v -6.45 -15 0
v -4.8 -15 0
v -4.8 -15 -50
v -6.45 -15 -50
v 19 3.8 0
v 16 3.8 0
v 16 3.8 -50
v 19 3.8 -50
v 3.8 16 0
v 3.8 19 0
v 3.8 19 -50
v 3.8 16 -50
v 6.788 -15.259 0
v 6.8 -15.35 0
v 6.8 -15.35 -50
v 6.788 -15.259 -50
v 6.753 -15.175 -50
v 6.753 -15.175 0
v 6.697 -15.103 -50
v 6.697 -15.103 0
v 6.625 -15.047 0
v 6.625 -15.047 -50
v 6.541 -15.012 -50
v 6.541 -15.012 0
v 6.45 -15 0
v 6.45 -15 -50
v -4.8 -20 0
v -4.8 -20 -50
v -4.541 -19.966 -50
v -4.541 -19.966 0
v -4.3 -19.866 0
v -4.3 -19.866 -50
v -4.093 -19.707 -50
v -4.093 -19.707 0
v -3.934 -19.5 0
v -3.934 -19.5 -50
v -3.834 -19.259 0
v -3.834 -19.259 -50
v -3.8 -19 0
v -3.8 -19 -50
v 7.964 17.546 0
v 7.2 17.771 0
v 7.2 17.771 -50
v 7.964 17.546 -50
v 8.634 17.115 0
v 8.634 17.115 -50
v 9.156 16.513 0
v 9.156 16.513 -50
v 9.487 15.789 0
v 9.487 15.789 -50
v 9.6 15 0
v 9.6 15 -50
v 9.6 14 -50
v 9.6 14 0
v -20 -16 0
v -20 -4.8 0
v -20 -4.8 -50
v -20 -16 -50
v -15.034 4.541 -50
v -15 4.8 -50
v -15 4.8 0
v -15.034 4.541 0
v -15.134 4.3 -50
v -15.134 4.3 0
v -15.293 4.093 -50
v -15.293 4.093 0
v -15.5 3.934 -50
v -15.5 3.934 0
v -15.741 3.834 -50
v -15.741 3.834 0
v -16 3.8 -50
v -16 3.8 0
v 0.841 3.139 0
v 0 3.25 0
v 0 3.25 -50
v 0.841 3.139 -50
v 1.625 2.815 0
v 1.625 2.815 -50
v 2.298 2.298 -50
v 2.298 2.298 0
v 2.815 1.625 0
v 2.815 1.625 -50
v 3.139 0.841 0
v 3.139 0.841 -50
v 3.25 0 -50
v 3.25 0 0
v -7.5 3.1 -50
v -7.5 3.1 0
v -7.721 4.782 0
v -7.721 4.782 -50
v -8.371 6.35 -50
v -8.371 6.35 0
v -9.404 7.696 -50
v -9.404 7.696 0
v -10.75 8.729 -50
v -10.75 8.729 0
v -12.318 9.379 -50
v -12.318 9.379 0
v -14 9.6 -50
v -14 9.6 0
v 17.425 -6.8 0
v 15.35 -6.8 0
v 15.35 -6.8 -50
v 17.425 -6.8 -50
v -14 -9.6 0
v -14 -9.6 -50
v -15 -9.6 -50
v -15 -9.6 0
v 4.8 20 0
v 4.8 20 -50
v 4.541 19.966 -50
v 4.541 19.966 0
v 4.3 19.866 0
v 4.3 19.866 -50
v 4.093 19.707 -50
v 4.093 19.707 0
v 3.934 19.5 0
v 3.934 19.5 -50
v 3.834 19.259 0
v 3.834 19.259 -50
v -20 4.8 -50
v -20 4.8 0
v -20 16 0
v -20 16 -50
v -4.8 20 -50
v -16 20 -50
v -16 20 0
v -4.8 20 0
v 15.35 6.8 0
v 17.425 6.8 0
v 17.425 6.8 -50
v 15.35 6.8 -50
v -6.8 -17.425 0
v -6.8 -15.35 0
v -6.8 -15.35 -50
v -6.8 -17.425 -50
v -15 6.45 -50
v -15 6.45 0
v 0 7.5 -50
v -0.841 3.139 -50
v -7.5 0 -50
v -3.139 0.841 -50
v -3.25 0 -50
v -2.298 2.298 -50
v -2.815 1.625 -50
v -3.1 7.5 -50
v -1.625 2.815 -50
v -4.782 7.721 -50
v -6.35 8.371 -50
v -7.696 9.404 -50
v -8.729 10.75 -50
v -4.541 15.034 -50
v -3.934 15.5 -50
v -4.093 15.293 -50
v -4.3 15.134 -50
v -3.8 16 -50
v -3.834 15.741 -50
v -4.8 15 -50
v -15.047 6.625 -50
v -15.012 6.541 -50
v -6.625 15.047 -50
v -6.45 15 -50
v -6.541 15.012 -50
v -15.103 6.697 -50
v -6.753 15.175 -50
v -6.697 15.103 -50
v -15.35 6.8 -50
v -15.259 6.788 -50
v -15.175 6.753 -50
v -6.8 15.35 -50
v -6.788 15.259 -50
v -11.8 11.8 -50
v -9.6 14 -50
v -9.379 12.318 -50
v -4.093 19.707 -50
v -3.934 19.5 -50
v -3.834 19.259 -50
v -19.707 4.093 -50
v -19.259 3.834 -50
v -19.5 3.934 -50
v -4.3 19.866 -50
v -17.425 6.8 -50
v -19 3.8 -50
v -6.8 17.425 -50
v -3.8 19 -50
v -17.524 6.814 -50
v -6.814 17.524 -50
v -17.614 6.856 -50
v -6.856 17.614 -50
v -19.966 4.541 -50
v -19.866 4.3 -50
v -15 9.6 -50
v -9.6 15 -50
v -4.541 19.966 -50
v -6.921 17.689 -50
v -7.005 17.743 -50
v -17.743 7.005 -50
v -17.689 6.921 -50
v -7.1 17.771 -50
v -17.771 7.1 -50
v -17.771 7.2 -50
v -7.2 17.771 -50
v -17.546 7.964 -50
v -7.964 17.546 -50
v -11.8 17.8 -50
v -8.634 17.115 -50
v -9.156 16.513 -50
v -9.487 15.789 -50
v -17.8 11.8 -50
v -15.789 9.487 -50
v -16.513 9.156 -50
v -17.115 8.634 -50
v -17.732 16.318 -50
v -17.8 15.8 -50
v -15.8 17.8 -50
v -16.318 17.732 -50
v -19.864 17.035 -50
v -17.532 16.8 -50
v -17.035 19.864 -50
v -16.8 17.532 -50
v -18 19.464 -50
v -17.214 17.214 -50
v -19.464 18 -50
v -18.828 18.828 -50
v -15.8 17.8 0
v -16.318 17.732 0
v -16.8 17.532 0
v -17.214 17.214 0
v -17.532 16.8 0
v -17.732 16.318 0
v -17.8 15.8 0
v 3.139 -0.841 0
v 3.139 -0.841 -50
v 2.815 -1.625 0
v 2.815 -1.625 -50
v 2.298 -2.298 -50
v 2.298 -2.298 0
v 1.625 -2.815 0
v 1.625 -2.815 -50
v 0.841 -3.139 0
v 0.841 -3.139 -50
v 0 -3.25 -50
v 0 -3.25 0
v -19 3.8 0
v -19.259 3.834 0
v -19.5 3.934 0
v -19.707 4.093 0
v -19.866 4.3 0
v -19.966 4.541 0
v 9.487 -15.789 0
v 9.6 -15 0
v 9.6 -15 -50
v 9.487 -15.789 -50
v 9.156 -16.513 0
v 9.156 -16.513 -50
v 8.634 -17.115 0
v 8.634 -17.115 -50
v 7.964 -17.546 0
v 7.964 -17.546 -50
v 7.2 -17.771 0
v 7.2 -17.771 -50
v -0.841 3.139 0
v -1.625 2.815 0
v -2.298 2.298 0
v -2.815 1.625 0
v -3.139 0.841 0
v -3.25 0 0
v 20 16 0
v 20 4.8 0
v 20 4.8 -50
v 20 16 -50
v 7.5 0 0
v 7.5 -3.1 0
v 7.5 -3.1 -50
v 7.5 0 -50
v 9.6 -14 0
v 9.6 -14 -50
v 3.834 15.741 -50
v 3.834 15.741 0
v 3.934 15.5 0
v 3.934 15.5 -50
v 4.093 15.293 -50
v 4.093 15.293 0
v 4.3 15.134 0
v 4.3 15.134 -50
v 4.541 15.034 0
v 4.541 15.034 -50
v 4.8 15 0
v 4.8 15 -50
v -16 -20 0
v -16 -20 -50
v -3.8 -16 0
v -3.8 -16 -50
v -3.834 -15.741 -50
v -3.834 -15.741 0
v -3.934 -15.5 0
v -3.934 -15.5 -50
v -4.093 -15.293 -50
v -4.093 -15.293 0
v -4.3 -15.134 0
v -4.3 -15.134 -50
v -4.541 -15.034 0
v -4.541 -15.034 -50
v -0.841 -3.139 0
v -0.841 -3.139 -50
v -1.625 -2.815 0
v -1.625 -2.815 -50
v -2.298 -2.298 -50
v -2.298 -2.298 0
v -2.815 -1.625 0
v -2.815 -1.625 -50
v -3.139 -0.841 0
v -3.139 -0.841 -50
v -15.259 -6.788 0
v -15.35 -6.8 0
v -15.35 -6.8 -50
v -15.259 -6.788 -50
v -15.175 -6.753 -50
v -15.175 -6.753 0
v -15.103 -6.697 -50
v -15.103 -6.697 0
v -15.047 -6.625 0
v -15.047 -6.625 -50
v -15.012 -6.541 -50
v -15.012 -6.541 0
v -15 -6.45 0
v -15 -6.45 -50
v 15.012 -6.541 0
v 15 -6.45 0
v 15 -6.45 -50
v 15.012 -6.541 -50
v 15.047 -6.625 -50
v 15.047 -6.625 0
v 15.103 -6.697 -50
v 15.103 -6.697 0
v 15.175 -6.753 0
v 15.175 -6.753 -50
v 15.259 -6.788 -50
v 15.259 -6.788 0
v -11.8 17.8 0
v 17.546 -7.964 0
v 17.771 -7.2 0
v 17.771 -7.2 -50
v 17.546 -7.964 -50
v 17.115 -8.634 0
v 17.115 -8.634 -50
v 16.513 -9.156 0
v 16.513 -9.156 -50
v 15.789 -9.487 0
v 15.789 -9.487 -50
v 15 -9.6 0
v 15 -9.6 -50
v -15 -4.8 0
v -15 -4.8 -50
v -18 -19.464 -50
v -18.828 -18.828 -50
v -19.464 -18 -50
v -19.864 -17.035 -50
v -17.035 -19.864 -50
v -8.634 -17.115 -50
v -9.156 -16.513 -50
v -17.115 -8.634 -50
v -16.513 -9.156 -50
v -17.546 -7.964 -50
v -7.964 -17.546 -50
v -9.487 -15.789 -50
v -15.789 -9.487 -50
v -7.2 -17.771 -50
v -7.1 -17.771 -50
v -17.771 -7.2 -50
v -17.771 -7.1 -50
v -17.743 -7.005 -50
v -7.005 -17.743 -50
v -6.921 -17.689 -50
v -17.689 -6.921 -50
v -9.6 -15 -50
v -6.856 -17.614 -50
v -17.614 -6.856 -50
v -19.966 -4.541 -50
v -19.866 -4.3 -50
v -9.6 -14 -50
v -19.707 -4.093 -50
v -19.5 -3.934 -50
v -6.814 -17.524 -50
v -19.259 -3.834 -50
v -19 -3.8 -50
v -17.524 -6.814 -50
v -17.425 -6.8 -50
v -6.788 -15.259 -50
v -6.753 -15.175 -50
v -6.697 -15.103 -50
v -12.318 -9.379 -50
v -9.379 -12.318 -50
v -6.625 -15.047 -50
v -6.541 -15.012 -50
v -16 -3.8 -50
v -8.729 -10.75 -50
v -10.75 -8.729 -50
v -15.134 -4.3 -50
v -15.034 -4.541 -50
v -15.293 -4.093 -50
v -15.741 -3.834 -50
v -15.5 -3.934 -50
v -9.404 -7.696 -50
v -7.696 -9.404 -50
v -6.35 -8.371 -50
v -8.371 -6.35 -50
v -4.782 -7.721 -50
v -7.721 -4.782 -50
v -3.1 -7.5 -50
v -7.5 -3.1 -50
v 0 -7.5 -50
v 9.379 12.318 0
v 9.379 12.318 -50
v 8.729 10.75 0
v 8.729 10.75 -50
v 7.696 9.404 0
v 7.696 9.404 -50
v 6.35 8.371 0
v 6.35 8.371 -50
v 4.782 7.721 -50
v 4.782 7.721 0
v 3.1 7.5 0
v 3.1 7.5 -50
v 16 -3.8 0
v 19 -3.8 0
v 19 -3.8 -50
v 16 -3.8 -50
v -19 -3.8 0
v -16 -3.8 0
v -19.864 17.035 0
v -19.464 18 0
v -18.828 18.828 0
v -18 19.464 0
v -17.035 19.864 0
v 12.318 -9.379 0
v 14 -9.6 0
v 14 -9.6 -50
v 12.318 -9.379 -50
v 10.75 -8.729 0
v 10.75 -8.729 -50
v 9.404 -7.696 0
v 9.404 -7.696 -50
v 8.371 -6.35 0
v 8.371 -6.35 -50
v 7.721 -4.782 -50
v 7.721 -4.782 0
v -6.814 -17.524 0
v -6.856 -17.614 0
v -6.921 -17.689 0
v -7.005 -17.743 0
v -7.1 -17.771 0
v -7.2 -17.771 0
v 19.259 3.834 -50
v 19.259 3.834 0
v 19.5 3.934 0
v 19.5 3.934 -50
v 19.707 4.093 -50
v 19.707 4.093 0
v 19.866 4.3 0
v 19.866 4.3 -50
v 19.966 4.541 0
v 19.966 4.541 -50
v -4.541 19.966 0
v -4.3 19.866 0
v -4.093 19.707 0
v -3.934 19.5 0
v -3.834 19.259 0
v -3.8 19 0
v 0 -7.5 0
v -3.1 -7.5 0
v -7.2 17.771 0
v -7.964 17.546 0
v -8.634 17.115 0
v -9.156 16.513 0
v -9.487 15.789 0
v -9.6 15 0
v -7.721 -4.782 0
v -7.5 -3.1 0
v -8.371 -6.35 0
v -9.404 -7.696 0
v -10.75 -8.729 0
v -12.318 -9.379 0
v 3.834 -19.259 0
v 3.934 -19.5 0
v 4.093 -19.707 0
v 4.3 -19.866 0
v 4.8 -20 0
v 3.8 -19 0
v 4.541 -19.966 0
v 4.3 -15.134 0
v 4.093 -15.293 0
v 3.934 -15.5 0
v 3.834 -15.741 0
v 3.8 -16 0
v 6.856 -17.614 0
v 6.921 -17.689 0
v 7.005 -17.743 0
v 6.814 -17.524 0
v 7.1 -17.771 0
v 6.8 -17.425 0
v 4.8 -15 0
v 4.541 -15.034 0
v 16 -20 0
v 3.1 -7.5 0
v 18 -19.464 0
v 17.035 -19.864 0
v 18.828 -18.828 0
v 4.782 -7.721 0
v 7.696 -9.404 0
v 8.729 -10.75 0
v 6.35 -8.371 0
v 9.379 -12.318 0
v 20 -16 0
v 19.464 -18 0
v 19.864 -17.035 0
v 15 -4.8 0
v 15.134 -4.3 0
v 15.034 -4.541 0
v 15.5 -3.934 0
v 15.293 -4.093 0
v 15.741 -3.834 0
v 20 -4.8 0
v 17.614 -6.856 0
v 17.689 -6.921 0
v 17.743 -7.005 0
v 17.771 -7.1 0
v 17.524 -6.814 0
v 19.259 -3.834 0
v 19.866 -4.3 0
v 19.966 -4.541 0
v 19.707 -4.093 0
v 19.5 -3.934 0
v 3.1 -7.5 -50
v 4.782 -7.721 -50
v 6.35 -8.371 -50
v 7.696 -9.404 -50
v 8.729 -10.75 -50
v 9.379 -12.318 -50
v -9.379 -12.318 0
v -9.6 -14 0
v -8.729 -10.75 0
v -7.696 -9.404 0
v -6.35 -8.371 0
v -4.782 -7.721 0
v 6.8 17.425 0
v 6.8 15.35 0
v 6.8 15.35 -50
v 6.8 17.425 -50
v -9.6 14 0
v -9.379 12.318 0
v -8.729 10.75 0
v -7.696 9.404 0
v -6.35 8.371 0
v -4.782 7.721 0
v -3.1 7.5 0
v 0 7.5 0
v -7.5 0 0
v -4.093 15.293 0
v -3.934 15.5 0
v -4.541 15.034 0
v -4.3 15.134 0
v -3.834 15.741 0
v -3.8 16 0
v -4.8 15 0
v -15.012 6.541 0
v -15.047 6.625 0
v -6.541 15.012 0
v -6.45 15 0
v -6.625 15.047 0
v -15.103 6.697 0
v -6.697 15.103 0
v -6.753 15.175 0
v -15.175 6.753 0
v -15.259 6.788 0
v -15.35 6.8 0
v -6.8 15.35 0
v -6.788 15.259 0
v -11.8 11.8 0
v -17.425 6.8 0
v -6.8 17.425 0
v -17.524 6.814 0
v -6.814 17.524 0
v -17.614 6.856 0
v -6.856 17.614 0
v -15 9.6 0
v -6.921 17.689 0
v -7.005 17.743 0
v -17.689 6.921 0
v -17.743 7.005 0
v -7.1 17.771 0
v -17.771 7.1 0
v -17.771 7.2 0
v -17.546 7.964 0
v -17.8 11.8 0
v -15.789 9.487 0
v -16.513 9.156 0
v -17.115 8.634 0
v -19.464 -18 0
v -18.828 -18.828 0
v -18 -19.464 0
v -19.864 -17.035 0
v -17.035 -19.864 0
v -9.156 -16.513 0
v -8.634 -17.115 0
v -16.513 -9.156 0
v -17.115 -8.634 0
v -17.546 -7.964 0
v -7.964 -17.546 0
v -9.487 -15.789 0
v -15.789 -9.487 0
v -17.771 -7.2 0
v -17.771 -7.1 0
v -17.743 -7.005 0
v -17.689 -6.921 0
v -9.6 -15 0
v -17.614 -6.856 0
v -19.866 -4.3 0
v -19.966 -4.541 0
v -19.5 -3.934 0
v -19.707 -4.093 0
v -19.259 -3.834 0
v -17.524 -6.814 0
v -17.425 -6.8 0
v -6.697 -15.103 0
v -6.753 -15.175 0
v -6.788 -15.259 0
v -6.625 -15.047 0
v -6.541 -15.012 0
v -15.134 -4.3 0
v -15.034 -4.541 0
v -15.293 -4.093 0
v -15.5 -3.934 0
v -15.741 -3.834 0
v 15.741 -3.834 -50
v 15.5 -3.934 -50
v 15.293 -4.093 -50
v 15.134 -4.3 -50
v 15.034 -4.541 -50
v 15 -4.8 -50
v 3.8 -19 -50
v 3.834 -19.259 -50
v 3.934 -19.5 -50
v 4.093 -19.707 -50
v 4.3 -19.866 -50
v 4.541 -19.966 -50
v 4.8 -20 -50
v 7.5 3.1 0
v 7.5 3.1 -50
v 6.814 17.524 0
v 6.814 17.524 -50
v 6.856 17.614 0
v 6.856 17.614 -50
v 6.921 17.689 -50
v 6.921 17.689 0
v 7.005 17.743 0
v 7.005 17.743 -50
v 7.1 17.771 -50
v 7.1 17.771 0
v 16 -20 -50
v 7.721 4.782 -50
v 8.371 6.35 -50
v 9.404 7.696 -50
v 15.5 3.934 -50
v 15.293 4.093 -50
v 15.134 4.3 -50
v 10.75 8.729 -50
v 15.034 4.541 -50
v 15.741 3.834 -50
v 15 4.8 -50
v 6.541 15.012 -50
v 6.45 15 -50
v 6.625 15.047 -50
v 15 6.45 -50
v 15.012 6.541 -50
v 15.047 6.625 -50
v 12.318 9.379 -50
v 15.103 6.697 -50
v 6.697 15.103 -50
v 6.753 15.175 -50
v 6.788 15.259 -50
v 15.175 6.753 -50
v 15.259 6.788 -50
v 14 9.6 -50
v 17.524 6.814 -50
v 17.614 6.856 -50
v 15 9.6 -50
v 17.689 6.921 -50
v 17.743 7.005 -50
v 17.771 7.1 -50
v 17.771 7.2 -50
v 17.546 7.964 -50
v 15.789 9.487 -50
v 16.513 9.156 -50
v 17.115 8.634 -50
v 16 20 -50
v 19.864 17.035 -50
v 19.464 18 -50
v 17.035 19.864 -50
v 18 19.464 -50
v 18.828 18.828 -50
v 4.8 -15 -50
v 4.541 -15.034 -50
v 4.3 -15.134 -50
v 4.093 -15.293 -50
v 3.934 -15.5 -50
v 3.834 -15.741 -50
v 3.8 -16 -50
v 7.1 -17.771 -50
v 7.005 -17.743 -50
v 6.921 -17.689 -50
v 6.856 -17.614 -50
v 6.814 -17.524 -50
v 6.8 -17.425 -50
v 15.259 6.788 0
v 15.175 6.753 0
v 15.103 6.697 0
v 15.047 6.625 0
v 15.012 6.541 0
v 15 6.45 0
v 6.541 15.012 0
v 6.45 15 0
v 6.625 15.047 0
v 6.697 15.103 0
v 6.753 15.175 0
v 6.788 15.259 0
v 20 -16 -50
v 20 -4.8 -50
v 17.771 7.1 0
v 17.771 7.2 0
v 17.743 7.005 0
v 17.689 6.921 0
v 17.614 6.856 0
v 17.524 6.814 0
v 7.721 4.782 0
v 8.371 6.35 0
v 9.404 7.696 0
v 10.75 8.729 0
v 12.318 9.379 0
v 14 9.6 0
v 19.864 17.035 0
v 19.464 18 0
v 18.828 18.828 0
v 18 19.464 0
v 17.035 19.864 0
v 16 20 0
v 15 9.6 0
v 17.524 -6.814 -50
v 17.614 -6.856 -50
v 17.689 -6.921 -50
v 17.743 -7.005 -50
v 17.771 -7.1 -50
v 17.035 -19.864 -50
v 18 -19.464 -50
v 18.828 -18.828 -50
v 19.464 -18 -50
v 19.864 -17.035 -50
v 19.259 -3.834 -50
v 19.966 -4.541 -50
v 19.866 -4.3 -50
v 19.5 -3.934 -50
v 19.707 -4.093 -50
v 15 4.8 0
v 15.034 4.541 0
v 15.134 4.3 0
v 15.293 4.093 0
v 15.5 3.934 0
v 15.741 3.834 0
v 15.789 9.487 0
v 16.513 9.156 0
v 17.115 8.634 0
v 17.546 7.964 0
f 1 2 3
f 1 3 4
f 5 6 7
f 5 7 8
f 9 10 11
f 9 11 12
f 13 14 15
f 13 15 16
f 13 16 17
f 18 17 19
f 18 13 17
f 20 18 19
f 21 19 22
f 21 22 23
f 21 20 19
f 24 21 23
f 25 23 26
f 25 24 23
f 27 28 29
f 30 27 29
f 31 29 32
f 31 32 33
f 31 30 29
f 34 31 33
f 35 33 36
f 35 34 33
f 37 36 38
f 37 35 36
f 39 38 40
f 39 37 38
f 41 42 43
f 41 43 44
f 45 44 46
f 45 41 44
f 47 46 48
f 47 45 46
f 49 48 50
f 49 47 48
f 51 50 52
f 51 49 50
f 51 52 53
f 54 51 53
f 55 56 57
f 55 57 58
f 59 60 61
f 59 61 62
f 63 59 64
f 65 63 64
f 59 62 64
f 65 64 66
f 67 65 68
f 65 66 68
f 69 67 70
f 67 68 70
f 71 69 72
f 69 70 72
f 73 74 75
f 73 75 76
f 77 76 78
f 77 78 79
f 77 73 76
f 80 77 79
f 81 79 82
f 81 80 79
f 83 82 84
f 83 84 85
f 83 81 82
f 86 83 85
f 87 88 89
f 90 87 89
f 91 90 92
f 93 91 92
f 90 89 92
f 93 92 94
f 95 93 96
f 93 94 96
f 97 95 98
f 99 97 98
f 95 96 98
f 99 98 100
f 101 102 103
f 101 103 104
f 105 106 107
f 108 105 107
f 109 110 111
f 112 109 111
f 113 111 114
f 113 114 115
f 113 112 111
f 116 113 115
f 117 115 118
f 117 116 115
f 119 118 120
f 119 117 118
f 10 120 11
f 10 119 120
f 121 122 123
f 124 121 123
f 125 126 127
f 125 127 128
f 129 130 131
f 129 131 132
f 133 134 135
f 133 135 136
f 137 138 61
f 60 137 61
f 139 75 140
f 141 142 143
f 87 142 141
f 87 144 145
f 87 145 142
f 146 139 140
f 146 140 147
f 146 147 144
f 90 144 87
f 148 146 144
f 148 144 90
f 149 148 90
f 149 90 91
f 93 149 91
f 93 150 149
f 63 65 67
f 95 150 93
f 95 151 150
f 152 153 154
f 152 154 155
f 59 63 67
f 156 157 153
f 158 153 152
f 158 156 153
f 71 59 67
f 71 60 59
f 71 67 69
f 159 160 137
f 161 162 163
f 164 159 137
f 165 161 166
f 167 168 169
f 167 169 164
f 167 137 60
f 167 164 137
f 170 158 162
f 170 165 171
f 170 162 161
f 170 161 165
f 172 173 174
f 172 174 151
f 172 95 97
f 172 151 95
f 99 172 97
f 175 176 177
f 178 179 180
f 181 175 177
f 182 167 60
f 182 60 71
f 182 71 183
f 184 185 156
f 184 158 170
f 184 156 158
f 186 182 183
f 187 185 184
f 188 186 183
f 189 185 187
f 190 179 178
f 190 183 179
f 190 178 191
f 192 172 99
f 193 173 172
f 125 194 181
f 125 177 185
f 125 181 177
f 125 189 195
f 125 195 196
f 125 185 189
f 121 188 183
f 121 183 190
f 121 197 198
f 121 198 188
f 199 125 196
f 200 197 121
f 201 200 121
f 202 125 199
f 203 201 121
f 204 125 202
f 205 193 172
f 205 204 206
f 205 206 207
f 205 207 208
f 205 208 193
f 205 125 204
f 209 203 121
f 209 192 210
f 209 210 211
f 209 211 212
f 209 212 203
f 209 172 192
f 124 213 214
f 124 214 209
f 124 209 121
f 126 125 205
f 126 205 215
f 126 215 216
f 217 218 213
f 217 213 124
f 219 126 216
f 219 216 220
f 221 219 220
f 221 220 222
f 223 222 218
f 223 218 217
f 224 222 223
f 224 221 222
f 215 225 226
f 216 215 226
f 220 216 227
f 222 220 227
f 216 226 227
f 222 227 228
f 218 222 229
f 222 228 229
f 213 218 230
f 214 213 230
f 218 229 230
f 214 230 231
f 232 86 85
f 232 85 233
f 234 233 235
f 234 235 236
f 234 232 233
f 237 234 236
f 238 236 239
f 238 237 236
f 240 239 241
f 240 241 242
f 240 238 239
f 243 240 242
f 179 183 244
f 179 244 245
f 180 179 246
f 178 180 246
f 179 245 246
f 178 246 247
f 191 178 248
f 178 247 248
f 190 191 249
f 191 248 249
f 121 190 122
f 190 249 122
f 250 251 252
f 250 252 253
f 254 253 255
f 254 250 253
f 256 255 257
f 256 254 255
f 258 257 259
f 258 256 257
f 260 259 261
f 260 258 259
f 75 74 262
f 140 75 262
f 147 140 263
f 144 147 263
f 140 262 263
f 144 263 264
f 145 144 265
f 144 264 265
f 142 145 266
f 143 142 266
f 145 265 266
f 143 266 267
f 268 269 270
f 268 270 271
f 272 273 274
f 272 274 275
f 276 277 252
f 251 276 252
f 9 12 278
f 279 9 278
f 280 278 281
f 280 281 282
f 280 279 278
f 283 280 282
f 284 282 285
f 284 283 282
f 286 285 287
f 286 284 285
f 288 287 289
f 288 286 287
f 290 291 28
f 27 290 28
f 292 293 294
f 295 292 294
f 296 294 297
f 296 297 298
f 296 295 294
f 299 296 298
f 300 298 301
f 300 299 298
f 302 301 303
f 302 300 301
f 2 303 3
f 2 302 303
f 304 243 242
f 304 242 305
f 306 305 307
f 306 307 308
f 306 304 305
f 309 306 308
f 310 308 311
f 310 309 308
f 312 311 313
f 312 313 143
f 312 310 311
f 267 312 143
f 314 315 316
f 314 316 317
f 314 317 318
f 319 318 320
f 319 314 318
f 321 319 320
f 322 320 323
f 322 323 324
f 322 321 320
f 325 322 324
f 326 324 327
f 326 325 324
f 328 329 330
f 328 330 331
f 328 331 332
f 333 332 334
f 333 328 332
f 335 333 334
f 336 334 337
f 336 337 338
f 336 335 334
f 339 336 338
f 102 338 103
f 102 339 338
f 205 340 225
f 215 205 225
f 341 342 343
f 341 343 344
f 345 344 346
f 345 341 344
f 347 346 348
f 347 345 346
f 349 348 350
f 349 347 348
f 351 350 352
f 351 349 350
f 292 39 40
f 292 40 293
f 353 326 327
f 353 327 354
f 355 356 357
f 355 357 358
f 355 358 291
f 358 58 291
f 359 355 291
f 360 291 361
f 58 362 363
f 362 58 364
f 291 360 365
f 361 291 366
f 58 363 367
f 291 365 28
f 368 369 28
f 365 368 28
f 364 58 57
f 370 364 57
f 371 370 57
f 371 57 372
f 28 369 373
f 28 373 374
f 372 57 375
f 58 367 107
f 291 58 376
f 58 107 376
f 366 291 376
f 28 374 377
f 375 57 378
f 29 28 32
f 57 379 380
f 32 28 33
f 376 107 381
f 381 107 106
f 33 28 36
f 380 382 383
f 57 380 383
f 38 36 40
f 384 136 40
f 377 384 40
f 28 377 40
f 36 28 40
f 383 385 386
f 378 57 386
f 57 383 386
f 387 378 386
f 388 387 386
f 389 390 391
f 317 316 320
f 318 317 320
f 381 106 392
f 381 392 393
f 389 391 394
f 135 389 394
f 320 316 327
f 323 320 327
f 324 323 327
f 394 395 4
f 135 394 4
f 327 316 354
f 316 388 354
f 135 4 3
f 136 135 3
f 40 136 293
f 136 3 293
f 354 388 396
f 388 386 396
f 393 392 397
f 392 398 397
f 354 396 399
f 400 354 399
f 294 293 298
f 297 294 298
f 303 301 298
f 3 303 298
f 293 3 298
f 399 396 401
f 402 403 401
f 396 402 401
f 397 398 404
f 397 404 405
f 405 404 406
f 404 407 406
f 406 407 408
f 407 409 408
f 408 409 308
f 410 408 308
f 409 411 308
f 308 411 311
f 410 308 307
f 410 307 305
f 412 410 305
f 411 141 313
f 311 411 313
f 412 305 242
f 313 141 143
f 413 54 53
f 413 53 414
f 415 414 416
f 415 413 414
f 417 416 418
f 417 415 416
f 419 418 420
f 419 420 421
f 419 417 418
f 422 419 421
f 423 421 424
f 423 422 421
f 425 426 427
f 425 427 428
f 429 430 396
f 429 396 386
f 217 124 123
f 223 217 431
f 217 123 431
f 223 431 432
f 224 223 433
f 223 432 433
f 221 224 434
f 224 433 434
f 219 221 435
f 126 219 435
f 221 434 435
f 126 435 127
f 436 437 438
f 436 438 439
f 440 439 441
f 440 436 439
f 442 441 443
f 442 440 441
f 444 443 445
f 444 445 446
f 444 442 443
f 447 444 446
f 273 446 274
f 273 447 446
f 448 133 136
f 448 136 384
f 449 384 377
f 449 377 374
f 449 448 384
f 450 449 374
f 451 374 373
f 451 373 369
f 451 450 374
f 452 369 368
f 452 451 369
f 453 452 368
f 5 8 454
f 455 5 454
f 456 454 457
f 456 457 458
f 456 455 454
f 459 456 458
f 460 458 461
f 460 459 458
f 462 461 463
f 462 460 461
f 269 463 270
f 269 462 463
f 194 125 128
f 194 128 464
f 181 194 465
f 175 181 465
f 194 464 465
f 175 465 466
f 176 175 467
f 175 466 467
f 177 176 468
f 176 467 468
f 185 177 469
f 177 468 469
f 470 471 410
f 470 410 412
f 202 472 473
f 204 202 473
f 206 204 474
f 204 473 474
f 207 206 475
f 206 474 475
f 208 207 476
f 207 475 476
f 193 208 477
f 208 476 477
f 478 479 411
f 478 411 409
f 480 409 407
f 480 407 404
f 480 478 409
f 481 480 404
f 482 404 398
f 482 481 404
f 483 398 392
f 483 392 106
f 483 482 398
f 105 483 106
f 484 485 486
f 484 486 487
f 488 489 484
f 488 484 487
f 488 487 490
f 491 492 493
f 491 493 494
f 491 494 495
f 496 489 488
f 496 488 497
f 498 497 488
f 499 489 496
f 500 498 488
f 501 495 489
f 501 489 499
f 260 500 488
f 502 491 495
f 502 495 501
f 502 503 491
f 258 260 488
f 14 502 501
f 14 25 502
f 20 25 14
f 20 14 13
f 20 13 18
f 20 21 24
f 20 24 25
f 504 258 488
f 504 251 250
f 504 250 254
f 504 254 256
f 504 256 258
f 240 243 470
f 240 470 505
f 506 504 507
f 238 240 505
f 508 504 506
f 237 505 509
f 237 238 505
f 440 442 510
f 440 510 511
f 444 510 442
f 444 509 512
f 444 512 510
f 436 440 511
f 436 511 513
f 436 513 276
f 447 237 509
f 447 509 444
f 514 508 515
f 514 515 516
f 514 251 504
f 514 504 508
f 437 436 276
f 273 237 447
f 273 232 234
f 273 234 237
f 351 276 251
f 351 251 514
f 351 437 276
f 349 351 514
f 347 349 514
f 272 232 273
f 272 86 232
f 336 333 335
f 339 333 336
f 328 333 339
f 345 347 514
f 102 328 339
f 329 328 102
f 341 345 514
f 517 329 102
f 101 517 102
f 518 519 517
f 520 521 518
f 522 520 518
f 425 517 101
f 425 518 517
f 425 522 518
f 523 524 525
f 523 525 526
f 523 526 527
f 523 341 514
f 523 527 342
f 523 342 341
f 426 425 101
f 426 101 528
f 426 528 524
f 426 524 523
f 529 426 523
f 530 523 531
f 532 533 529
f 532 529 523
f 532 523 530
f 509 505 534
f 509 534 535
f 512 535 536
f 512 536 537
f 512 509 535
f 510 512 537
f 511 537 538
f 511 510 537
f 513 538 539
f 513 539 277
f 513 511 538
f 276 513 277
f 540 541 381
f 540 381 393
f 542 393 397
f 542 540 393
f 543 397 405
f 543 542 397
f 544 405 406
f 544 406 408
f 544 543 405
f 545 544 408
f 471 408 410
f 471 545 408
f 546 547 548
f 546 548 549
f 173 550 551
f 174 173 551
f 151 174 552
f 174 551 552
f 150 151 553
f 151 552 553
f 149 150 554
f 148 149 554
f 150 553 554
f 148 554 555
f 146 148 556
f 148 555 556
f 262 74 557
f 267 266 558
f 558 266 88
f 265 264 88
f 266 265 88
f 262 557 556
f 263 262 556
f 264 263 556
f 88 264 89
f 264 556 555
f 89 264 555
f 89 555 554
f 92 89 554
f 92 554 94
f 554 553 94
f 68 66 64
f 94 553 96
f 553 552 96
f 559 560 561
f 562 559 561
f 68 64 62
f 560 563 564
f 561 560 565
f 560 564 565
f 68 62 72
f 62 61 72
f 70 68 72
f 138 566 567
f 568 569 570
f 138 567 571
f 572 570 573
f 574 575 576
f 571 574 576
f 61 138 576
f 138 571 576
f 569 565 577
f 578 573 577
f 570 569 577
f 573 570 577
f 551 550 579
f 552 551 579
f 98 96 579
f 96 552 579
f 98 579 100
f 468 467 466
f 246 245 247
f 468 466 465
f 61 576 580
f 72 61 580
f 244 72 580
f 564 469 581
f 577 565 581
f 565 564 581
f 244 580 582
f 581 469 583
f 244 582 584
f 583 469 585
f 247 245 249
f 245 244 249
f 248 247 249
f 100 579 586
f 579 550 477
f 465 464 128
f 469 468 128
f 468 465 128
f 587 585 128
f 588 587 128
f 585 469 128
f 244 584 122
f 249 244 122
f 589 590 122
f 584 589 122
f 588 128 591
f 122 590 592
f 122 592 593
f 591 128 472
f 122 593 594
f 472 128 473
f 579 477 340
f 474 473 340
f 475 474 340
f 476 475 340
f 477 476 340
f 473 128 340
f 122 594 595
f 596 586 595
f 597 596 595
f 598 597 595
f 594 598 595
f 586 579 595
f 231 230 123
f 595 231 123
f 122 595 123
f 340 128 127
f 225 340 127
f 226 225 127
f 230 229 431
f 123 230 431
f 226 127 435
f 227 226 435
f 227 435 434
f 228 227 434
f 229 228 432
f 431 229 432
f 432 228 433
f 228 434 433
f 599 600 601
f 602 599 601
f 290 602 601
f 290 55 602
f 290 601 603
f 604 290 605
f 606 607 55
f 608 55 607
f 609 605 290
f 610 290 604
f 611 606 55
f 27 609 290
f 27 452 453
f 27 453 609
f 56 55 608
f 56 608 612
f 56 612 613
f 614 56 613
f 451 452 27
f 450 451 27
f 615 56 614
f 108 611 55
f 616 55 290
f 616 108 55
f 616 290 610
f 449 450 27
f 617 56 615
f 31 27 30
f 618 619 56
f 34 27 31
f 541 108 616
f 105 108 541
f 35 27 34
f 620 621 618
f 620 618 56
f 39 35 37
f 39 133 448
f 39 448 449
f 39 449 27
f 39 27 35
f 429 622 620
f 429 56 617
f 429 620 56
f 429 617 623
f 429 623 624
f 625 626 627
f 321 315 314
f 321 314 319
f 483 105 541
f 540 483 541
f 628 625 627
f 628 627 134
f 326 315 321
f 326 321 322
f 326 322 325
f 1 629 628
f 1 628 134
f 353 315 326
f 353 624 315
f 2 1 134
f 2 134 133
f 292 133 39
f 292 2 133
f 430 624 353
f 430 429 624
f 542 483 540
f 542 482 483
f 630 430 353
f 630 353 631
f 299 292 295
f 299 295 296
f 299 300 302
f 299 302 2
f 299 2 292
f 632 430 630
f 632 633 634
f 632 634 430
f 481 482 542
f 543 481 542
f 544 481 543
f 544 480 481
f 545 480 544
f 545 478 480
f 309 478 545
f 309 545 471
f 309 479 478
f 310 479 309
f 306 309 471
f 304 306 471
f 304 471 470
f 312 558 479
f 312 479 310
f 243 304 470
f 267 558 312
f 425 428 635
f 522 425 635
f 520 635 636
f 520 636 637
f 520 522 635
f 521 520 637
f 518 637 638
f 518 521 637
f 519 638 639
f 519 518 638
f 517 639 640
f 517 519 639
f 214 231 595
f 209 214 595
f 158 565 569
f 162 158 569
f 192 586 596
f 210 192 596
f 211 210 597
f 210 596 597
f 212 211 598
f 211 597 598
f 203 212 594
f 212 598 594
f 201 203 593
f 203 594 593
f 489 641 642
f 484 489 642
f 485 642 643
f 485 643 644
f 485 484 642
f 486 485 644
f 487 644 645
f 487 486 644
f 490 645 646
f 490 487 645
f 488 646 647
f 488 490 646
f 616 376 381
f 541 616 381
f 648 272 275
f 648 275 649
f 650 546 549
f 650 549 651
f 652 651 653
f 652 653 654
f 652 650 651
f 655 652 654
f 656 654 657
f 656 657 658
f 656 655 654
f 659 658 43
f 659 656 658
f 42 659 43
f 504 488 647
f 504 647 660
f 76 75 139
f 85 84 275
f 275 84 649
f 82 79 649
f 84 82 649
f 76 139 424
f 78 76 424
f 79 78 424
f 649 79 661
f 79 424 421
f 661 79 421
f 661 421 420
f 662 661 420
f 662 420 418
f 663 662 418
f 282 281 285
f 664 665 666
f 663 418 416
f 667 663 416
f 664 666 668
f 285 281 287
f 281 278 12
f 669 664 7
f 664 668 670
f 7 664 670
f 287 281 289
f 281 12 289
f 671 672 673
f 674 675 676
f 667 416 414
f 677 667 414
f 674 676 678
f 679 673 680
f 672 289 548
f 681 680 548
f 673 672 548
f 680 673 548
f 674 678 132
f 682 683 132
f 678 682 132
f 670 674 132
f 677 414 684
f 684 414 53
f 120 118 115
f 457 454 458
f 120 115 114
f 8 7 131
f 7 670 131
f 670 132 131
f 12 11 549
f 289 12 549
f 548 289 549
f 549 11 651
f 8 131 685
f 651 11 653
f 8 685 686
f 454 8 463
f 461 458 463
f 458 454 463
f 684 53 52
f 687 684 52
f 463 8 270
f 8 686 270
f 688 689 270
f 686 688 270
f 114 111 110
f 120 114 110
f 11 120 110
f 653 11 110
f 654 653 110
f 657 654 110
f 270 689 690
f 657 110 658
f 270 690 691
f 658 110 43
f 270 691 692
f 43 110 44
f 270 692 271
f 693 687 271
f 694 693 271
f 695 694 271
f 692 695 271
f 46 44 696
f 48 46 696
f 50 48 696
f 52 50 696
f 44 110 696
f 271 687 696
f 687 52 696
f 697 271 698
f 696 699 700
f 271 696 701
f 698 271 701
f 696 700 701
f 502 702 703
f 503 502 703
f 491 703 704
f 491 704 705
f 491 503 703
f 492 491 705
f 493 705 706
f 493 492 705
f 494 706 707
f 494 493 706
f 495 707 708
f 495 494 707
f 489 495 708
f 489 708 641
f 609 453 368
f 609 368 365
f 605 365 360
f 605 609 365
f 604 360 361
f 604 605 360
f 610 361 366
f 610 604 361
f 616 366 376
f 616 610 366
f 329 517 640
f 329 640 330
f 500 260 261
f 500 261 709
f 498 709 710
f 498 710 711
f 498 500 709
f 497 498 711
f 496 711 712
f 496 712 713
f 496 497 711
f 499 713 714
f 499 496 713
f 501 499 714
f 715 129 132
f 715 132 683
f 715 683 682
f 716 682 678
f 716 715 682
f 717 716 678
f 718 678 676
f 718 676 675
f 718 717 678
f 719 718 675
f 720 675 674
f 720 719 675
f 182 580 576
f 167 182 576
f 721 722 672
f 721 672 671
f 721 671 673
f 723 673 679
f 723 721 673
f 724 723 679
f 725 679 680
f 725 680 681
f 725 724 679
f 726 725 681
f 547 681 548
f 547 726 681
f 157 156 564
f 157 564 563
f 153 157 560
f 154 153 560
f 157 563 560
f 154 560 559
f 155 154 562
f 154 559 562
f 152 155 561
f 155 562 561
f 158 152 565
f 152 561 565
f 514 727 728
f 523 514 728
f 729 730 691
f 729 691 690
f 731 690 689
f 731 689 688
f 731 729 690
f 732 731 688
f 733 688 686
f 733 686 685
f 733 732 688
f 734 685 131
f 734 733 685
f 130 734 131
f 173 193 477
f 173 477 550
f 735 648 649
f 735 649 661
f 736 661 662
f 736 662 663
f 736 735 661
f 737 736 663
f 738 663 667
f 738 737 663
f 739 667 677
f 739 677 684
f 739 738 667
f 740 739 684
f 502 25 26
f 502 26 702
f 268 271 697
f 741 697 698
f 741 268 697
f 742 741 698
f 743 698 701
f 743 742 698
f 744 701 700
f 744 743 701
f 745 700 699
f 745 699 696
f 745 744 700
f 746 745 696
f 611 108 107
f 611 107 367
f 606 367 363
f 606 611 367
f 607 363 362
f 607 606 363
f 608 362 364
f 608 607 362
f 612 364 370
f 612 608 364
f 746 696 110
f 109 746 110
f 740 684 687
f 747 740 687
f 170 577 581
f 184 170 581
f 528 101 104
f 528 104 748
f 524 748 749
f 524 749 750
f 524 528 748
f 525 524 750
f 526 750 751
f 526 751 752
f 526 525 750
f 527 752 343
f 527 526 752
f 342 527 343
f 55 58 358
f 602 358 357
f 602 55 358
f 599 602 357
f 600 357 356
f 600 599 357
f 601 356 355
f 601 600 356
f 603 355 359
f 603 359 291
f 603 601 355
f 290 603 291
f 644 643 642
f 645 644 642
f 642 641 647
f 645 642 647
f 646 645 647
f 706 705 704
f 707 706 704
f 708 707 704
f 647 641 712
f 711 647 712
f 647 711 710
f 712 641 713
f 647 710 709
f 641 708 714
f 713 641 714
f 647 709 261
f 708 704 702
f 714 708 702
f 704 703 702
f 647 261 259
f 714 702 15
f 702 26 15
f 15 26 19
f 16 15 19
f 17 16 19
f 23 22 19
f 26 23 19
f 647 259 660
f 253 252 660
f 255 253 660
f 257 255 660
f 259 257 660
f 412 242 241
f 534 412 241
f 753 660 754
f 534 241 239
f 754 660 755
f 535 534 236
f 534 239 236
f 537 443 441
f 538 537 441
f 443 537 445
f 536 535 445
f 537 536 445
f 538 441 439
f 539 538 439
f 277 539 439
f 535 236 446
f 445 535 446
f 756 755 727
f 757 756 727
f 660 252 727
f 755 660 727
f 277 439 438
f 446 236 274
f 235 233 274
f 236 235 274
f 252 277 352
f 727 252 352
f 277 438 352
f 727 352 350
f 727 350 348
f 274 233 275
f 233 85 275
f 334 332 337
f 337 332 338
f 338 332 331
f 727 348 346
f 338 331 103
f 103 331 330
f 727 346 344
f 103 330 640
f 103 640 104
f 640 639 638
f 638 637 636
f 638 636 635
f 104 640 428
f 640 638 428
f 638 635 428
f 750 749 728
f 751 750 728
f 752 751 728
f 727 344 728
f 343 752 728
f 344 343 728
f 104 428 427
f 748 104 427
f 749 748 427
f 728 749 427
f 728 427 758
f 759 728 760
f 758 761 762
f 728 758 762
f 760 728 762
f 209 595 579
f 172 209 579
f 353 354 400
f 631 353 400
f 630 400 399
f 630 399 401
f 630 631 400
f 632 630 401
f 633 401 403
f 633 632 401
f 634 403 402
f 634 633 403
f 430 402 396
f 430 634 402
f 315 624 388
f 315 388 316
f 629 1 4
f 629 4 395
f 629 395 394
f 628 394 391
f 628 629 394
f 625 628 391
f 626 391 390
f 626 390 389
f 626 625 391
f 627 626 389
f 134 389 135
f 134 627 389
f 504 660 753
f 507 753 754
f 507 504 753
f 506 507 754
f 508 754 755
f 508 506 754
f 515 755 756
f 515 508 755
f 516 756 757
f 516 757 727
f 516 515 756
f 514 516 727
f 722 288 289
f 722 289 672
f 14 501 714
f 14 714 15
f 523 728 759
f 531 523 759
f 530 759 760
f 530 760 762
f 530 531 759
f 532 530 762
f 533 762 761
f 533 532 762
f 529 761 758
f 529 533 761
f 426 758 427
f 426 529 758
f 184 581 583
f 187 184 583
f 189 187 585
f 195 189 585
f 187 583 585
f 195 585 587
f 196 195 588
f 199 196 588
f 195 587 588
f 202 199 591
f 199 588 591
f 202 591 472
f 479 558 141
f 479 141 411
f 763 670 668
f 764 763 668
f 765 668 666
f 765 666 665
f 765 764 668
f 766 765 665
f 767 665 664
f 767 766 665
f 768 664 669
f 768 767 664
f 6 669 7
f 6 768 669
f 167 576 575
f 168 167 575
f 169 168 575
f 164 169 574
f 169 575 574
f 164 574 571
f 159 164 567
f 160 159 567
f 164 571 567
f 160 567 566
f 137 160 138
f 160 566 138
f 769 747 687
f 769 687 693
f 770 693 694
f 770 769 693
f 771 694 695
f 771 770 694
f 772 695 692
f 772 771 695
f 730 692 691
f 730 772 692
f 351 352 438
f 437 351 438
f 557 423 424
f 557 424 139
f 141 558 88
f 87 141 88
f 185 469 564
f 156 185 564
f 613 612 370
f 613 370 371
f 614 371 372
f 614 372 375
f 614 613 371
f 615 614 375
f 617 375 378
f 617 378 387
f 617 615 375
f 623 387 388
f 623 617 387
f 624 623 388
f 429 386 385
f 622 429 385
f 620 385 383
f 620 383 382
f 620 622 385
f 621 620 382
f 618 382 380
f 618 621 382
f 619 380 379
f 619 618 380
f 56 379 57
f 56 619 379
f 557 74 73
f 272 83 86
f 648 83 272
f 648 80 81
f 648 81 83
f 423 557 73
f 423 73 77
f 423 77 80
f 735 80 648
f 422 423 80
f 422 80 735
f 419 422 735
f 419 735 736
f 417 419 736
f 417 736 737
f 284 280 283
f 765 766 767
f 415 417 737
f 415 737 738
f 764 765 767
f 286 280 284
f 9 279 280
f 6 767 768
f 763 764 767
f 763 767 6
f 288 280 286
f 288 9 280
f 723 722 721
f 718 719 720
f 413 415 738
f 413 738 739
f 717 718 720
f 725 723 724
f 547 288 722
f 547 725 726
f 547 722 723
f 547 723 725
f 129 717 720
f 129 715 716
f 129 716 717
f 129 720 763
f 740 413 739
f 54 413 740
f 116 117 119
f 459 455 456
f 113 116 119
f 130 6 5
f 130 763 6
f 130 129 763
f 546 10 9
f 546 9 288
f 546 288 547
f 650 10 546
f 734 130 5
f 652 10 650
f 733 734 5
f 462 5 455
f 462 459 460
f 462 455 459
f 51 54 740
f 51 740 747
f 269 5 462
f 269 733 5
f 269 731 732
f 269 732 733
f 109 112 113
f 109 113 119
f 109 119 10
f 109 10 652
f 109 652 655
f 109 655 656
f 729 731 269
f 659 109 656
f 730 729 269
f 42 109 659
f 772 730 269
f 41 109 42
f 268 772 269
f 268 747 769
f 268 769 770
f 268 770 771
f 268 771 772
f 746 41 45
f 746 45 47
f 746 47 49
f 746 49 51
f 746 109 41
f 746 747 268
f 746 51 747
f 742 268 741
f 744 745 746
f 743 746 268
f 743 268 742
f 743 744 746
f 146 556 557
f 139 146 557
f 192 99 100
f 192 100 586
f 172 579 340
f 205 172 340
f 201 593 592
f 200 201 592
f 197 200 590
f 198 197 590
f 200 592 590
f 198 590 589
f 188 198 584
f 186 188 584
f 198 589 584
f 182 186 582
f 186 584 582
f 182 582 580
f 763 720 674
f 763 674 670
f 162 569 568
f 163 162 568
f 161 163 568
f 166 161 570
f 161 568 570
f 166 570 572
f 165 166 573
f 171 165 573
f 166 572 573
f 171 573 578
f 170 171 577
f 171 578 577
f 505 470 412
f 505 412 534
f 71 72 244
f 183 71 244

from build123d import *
from build123d.topology import SkipClean

# Parameters (mm, degrees)
Y_KSEKLIK_EKSTR_ZYON1_DEPTH = 50


with BuildPart() as part:
    # Çizim1 → Yükseklik-Ekstrüzyon1 (new body)
    # profile 1 of 4: a face of its own
    with SkipClean():  # the faces are left unmerged after this step: merging them gives an invalid solid
        with BuildSketch(Plane.XY):
            with BuildLine():
                ThreePointArc((-20, 16), (-18.828427125, 18.828427125), (-16, 20))
                Line((-16, 20), (-4.8, 20))
                ThreePointArc((-4.8, 20), (-4.092893219, 19.707106781), (-3.8, 19))
                Line((-3.8, 19), (-3.8, 16))
                ThreePointArc((-3.8, 16), (-4.092893219, 15.292893219), (-4.8, 15))
                Line((-4.8, 15), (-6.45, 15))
                ThreePointArc((-6.45, 15), (-6.697487373, 15.102512627), (-6.8, 15.35))
                Line((-6.8, 15.35), (-6.8, 17.424871131))
                ThreePointArc((-6.8, 17.424871131), (-6.920871215, 17.689446262), (-7.2, 17.771281292))
                ThreePointArc((-7.2, 17.771281292), (-8.916601049, 16.833030278), (-9.6, 15))
                Line((-9.6, 15), (-9.6, 14))
                ThreePointArc((-9.6, 14), (-7.696194078, 9.403805922), (-3.1, 7.5))
                Line((-3.1, 7.5), (0, 7.5))
                Line((0, 7.5), (0, 3.25))
                ThreePointArc((0, 3.25), (-2.298097039, 2.298097039), (-3.25, 0))
                Line((-3.25, 0), (-7.5, 0))
                Line((-7.5, 0), (-7.5, 3.1))
                ThreePointArc((-7.5, 3.1), (-9.403805922, 7.696194078), (-14, 9.6))
                Line((-14, 9.6), (-15, 9.6))
                ThreePointArc((-15, 9.6), (-16.833030278, 8.916601049), (-17.771281292, 7.2))
                ThreePointArc((-17.771281292, 7.2), (-17.689446262, 6.920871215), (-17.424871131, 6.8))
                Line((-17.424871131, 6.8), (-15.35, 6.8))
                ThreePointArc((-15.35, 6.8), (-15.102512627, 6.697487373), (-15, 6.45))
                Line((-15, 6.45), (-15, 4.8))
                ThreePointArc((-15, 4.8), (-15.292893219, 4.092893219), (-16, 3.8))
                Line((-16, 3.8), (-19, 3.8))
                ThreePointArc((-19, 3.8), (-19.707106781, 4.092893219), (-20, 4.8))
                Line((-20, 4.8), (-20, 16))
            make_face()
            with BuildLine():
                ThreePointArc((-15.8, 17.8), (-17.214213562, 17.214213562), (-17.8, 15.8))
                Line((-17.8, 15.8), (-17.8, 11.8))
                Line((-17.8, 11.8), (-11.8, 11.8))
                Line((-11.8, 11.8), (-11.8, 17.8))
                Line((-11.8, 17.8), (-15.8, 17.8))
            make_face(mode=Mode.SUBTRACT)
        # profile 2 of 4: a face of its own
        with BuildSketch(Plane.XY):
            with BuildLine():
                Line((16, 3.8), (19, 3.8))
                ThreePointArc((19, 3.8), (19.707106781, 4.092893219), (20, 4.8))
                Line((20, 4.8), (20, 16))
                ThreePointArc((20, 16), (18.828427125, 18.828427125), (16, 20))
                Line((16, 20), (4.8, 20))
                ThreePointArc((4.8, 20), (4.092893219, 19.707106781), (3.8, 19))
                Line((3.8, 19), (3.8, 16))
                ThreePointArc((3.8, 16), (4.092893219, 15.292893219), (4.8, 15))
                Line((4.8, 15), (6.45, 15))
                ThreePointArc((6.45, 15), (6.697487373, 15.102512627), (6.8, 15.35))
                Line((6.8, 15.35), (6.8, 17.424871131))
                ThreePointArc((6.8, 17.424871131), (6.920871215, 17.689446262), (7.2, 17.771281292))
                ThreePointArc((7.2, 17.771281292), (8.916601049, 16.833030278), (9.6, 15))
                Line((9.6, 15), (9.6, 14))
                ThreePointArc((9.6, 14), (7.696194078, 9.403805922), (3.1, 7.5))
                Line((3.1, 7.5), (0, 7.5))
                Line((0, 7.5), (0, 3.25))
                ThreePointArc((0, 3.25), (2.298097039, 2.298097039), (3.25, 0))
                Line((3.25, 0), (7.5, 0))
                Line((7.5, 0), (7.5, 3.1))
                ThreePointArc((7.5, 3.1), (9.403805922, 7.696194078), (14, 9.6))
                Line((14, 9.6), (15, 9.6))
                ThreePointArc((15, 9.6), (16.833030278, 8.916601049), (17.771281292, 7.2))
                ThreePointArc((17.771281292, 7.2), (17.689446262, 6.920871215), (17.424871131, 6.8))
                Line((17.424871131, 6.8), (15.35, 6.8))
                ThreePointArc((15.35, 6.8), (15.102512627, 6.697487373), (15, 6.45))
                Line((15, 6.45), (15, 4.8))
                ThreePointArc((15, 4.8), (15.292893219, 4.092893219), (16, 3.8))
            make_face()
        # profile 3 of 4: a face of its own
        with BuildSketch(Plane.XY):
            with BuildLine():
                Line((3.8, -16), (3.8, -19))
                ThreePointArc((3.8, -19), (4.092893219, -19.707106781), (4.8, -20))
                Line((4.8, -20), (16, -20))
                ThreePointArc((16, -20), (18.828427125, -18.828427125), (20, -16))
                Line((20, -16), (20, -4.8))
                ThreePointArc((20, -4.8), (19.707106781, -4.092893219), (19, -3.8))
                Line((19, -3.8), (16, -3.8))
                ThreePointArc((16, -3.8), (15.292893219, -4.092893219), (15, -4.8))
                Line((15, -4.8), (15, -6.45))
                ThreePointArc((15, -6.45), (15.102512627, -6.697487373), (15.35, -6.8))
                Line((15.35, -6.8), (17.424871131, -6.8))
                ThreePointArc((17.424871131, -6.8), (17.689446262, -6.920871215), (17.771281292, -7.2))
                ThreePointArc((17.771281292, -7.2), (16.833030278, -8.916601049), (15, -9.6))
                Line((15, -9.6), (14, -9.6))
                ThreePointArc((14, -9.6), (9.403805922, -7.696194078), (7.5, -3.1))
                Line((7.5, -3.1), (7.5, 0))
                Line((7.5, 0), (3.25, 0))
                ThreePointArc((3.25, 0), (2.298097039, -2.298097039), (0, -3.25))
                Line((0, -3.25), (0, -7.5))
                Line((0, -7.5), (3.1, -7.5))
                ThreePointArc((3.1, -7.5), (7.696194078, -9.403805922), (9.6, -14))
                Line((9.6, -14), (9.6, -15))
                ThreePointArc((9.6, -15), (8.916601049, -16.833030278), (7.2, -17.771281292))
                ThreePointArc((7.2, -17.771281292), (6.920871215, -17.689446262), (6.8, -17.424871131))
                Line((6.8, -17.424871131), (6.8, -15.35))
                ThreePointArc((6.8, -15.35), (6.697487373, -15.102512627), (6.45, -15))
                Line((6.45, -15), (4.8, -15))
                ThreePointArc((4.8, -15), (4.092893219, -15.292893219), (3.8, -16))
            make_face()
        # profile 4 of 4: a face of its own
        with BuildSketch(Plane.XY):
            with BuildLine():
                Line((-16, -3.8), (-19, -3.8))
                ThreePointArc((-19, -3.8), (-19.707106781, -4.092893219), (-20, -4.8))
                Line((-20, -4.8), (-20, -16))
                ThreePointArc((-20, -16), (-18.828427125, -18.828427125), (-16, -20))
                Line((-16, -20), (-4.8, -20))
                ThreePointArc((-4.8, -20), (-4.092893219, -19.707106781), (-3.8, -19))
                Line((-3.8, -19), (-3.8, -16))
                ThreePointArc((-3.8, -16), (-4.092893219, -15.292893219), (-4.8, -15))
                Line((-4.8, -15), (-6.45, -15))
                ThreePointArc((-6.45, -15), (-6.697487373, -15.102512627), (-6.8, -15.35))
                Line((-6.8, -15.35), (-6.8, -17.424871131))
                ThreePointArc((-6.8, -17.424871131), (-6.920871215, -17.689446262), (-7.2, -17.771281292))
                ThreePointArc((-7.2, -17.771281292), (-8.916601049, -16.833030278), (-9.6, -15))
                Line((-9.6, -15), (-9.6, -14))
                ThreePointArc((-9.6, -14), (-7.696194078, -9.403805922), (-3.1, -7.5))
                Line((-3.1, -7.5), (0, -7.5))
                Line((0, -7.5), (0, -3.25))
                ThreePointArc((0, -3.25), (-2.298097039, -2.298097039), (-3.25, 0))
                Line((-3.25, 0), (-7.5, 0))
                Line((-7.5, 0), (-7.5, -3.1))
                ThreePointArc((-7.5, -3.1), (-9.403805922, -7.696194078), (-14, -9.6))
                Line((-14, -9.6), (-15, -9.6))
                ThreePointArc((-15, -9.6), (-16.833030278, -8.916601049), (-17.771281292, -7.2))
                ThreePointArc((-17.771281292, -7.2), (-17.689446262, -6.920871215), (-17.424871131, -6.8))
                Line((-17.424871131, -6.8), (-15.35, -6.8))
                ThreePointArc((-15.35, -6.8), (-15.102512627, -6.697487373), (-15, -6.45))
                Line((-15, -6.45), (-15, -4.8))
                ThreePointArc((-15, -4.8), (-15.292893219, -4.092893219), (-16, -3.8))
            make_face()
        extrude(amount=-Y_KSEKLIK_EKSTR_ZYON1_DEPTH)


solid = part.part
